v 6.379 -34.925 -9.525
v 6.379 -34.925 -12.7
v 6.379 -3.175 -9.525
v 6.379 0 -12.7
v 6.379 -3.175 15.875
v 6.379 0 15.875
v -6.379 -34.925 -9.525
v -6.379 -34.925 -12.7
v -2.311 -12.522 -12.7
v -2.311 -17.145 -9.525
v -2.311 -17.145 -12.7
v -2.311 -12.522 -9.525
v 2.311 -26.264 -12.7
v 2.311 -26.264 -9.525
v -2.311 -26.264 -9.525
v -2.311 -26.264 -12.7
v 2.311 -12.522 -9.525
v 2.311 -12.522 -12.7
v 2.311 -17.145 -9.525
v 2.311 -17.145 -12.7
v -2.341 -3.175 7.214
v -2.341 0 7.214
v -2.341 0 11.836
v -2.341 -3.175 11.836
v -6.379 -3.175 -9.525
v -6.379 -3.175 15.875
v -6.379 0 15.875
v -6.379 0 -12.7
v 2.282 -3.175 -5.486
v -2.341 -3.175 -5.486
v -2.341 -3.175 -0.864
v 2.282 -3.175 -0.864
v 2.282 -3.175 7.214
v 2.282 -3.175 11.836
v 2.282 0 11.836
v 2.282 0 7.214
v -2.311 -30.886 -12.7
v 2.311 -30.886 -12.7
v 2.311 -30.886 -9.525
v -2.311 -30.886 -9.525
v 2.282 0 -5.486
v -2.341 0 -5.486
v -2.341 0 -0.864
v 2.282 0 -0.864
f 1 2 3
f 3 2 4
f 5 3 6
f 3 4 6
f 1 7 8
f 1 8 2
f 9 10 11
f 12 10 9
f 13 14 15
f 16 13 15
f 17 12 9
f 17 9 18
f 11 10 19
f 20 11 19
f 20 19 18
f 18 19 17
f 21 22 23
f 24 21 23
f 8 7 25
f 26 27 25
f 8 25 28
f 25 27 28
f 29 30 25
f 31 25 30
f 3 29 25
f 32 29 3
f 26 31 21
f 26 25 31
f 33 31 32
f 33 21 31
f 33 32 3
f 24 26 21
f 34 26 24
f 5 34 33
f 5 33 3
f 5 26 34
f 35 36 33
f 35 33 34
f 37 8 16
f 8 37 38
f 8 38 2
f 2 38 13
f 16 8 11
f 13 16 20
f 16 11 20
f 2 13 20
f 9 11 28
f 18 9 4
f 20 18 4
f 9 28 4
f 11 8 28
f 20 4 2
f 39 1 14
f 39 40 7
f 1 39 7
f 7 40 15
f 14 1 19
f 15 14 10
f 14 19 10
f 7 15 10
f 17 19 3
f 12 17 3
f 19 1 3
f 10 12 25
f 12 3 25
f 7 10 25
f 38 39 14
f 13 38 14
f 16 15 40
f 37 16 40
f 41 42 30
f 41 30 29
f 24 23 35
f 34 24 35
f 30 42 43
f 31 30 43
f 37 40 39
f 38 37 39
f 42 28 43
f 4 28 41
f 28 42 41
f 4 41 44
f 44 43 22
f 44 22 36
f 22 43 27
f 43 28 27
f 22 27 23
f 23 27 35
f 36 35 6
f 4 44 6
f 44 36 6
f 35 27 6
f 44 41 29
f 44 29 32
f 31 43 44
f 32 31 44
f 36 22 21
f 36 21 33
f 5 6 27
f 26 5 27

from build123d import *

# Parameters (mm, degrees)
F0_W     = 4.6228
F0_H     = 4.6228
F1_DEPTH = 3.175
F2_DEPTH = 34.925
F3_W     = 4.6228
F3_H     = 4.6228
F4_DEPTH = 25.4


with BuildPart() as f1:
    # F0 (on Front) → F1 (new body)
    with BuildSketch(Plane.XZ):
        Polygon((6.37921, -9.525), (6.37921, 15.875), (-6.37921, 15.875), (-6.37921, -9.525), (-1.8334548599, -9.525), align=None)
        with Locations((-0.02921, -3.175)):
            Rectangle(F0_W, F0_H, mode=Mode.SUBTRACT)
        with Locations((-0.02921, 9.525)):
            Rectangle(F0_W, F0_H, mode=Mode.SUBTRACT)
    extrude(amount=F1_DEPTH)

    # F0 (on Front) → F2 (join)
    with BuildSketch(Plane.XZ):
        Polygon((6.37921, -12.7), (6.37921, -9.525), (-1.8334548599, -9.525), (-6.37921, -9.525), (-6.37921, -12.7), (2.7123002801, -12.7), align=None)
    extrude(amount=F2_DEPTH)

    # F3 (on face) → F4 (cut)
    with BuildSketch(Plane.XY.offset(-9.525)):
        with Locations((0, -14.8336)):
            Rectangle(F3_W, F3_H)
        Polygon((-2.3114, -30.8864), (0, -30.8864), (2.3114, -30.8864), (2.3114, -26.2636), (-2.3114, -26.2636), align=None)
    extrude(amount=-F4_DEPTH, mode=Mode.SUBTRACT)


solid = f1.part
